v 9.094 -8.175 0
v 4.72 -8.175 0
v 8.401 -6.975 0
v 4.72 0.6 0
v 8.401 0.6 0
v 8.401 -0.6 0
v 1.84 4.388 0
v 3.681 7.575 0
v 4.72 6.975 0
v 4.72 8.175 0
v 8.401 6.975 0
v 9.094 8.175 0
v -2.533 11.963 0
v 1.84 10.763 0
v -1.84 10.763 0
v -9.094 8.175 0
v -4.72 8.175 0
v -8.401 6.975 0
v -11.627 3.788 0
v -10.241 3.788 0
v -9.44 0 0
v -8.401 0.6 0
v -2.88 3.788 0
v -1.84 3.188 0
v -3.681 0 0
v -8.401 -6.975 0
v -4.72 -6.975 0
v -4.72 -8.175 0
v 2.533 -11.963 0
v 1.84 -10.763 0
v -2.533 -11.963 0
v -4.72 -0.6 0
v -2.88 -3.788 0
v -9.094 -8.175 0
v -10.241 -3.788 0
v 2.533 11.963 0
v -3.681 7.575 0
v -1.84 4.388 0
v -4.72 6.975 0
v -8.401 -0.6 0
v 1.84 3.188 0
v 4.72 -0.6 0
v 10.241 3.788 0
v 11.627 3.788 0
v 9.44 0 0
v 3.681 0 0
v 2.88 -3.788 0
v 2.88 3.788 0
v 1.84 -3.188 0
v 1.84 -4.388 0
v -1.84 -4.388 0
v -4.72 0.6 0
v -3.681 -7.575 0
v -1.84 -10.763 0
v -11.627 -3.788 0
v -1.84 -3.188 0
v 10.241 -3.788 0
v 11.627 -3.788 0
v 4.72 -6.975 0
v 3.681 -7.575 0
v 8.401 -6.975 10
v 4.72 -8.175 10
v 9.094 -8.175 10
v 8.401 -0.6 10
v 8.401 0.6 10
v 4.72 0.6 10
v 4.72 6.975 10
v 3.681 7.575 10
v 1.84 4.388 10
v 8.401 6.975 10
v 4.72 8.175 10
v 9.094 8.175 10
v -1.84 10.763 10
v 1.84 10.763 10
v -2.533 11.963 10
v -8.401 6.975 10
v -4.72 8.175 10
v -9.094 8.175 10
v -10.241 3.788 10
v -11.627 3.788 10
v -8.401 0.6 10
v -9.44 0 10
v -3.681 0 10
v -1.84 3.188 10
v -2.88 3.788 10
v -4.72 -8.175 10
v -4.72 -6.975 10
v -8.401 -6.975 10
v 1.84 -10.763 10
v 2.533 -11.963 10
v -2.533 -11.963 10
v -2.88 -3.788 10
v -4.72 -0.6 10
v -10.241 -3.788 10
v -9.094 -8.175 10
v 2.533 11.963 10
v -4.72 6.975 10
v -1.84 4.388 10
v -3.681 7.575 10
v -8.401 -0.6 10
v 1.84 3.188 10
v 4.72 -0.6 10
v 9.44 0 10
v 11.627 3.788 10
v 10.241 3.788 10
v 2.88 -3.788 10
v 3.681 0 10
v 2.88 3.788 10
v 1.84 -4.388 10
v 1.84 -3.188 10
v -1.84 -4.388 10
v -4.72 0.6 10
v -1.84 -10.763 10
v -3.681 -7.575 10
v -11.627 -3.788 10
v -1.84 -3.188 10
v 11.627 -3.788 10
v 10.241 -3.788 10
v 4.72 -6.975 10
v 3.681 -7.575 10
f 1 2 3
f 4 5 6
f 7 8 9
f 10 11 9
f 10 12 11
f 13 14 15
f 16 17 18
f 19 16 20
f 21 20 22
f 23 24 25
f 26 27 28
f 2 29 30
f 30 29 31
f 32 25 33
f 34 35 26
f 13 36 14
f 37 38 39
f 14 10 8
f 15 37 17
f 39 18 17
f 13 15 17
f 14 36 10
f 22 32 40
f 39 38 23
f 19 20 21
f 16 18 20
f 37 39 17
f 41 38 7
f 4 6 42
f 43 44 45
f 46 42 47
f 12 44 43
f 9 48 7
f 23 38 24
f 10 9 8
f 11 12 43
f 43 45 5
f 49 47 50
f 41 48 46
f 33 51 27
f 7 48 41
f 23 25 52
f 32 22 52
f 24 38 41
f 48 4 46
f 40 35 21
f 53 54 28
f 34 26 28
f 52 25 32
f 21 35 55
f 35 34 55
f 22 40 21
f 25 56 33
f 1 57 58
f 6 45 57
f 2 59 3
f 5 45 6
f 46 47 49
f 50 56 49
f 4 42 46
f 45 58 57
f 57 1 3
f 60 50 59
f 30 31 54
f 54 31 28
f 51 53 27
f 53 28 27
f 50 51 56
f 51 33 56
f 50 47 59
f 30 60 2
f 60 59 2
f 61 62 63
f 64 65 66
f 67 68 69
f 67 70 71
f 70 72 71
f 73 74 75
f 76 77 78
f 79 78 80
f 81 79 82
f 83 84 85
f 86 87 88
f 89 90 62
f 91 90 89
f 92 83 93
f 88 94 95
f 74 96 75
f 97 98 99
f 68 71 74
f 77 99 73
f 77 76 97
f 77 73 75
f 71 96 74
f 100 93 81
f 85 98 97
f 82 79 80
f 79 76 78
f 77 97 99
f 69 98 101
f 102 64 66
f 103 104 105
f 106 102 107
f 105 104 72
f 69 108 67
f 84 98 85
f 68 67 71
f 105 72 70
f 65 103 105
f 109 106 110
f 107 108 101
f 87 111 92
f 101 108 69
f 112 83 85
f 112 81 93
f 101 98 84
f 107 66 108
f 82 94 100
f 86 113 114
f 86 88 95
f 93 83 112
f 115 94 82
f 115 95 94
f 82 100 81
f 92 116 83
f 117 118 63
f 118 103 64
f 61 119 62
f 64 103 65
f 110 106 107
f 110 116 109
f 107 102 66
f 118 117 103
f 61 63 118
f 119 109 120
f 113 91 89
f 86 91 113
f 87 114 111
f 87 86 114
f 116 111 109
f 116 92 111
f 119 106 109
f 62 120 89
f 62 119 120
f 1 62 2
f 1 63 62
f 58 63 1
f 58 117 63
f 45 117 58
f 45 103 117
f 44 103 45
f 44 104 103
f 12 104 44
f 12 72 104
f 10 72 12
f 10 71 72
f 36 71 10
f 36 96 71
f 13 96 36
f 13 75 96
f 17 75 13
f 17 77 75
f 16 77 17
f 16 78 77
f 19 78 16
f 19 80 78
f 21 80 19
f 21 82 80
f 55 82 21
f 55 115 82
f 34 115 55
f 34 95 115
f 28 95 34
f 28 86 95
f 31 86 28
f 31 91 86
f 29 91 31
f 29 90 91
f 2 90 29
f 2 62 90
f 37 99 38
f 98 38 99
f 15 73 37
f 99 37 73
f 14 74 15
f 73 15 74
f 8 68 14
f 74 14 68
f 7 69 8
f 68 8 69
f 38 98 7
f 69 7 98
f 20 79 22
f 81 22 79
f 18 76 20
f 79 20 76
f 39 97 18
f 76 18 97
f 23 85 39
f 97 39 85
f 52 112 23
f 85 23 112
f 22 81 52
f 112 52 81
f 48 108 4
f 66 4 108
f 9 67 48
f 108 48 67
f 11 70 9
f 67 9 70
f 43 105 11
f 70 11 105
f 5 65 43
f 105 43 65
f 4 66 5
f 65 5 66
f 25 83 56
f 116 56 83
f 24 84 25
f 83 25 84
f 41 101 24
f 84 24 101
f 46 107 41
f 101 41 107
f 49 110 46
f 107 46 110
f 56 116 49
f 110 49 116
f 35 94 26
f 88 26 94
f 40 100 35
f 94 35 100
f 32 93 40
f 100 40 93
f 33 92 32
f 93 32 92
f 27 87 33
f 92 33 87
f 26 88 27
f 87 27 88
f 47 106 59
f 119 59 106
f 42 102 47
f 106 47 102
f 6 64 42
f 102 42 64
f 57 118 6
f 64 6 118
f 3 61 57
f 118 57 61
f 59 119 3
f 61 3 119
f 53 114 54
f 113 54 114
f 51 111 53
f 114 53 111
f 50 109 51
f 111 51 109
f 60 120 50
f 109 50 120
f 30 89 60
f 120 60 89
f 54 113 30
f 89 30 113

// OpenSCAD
//measured
bitDiameterInches = .251;
shankLength = 20;
//designed
twt = 1.2;
//constant
inch = 25.4;
//calculated
bitDiameter = bitDiameterInches * inch;
bitCircumDiameter = bitDiameter / cos(30);

module x() {
  circle(d = bitCircumDiameter, $fn = 6);
  for (i = [0:5]) {
    rotate([0, 0, i / 6 * 360]) translate([0, bitDiameter + twt, 0]) circle(d = bitCircumDiameter, $fn = 6);
  }
}
linear_extrude(10) difference() {
  offset(delta = twt) x();
  x();
}
